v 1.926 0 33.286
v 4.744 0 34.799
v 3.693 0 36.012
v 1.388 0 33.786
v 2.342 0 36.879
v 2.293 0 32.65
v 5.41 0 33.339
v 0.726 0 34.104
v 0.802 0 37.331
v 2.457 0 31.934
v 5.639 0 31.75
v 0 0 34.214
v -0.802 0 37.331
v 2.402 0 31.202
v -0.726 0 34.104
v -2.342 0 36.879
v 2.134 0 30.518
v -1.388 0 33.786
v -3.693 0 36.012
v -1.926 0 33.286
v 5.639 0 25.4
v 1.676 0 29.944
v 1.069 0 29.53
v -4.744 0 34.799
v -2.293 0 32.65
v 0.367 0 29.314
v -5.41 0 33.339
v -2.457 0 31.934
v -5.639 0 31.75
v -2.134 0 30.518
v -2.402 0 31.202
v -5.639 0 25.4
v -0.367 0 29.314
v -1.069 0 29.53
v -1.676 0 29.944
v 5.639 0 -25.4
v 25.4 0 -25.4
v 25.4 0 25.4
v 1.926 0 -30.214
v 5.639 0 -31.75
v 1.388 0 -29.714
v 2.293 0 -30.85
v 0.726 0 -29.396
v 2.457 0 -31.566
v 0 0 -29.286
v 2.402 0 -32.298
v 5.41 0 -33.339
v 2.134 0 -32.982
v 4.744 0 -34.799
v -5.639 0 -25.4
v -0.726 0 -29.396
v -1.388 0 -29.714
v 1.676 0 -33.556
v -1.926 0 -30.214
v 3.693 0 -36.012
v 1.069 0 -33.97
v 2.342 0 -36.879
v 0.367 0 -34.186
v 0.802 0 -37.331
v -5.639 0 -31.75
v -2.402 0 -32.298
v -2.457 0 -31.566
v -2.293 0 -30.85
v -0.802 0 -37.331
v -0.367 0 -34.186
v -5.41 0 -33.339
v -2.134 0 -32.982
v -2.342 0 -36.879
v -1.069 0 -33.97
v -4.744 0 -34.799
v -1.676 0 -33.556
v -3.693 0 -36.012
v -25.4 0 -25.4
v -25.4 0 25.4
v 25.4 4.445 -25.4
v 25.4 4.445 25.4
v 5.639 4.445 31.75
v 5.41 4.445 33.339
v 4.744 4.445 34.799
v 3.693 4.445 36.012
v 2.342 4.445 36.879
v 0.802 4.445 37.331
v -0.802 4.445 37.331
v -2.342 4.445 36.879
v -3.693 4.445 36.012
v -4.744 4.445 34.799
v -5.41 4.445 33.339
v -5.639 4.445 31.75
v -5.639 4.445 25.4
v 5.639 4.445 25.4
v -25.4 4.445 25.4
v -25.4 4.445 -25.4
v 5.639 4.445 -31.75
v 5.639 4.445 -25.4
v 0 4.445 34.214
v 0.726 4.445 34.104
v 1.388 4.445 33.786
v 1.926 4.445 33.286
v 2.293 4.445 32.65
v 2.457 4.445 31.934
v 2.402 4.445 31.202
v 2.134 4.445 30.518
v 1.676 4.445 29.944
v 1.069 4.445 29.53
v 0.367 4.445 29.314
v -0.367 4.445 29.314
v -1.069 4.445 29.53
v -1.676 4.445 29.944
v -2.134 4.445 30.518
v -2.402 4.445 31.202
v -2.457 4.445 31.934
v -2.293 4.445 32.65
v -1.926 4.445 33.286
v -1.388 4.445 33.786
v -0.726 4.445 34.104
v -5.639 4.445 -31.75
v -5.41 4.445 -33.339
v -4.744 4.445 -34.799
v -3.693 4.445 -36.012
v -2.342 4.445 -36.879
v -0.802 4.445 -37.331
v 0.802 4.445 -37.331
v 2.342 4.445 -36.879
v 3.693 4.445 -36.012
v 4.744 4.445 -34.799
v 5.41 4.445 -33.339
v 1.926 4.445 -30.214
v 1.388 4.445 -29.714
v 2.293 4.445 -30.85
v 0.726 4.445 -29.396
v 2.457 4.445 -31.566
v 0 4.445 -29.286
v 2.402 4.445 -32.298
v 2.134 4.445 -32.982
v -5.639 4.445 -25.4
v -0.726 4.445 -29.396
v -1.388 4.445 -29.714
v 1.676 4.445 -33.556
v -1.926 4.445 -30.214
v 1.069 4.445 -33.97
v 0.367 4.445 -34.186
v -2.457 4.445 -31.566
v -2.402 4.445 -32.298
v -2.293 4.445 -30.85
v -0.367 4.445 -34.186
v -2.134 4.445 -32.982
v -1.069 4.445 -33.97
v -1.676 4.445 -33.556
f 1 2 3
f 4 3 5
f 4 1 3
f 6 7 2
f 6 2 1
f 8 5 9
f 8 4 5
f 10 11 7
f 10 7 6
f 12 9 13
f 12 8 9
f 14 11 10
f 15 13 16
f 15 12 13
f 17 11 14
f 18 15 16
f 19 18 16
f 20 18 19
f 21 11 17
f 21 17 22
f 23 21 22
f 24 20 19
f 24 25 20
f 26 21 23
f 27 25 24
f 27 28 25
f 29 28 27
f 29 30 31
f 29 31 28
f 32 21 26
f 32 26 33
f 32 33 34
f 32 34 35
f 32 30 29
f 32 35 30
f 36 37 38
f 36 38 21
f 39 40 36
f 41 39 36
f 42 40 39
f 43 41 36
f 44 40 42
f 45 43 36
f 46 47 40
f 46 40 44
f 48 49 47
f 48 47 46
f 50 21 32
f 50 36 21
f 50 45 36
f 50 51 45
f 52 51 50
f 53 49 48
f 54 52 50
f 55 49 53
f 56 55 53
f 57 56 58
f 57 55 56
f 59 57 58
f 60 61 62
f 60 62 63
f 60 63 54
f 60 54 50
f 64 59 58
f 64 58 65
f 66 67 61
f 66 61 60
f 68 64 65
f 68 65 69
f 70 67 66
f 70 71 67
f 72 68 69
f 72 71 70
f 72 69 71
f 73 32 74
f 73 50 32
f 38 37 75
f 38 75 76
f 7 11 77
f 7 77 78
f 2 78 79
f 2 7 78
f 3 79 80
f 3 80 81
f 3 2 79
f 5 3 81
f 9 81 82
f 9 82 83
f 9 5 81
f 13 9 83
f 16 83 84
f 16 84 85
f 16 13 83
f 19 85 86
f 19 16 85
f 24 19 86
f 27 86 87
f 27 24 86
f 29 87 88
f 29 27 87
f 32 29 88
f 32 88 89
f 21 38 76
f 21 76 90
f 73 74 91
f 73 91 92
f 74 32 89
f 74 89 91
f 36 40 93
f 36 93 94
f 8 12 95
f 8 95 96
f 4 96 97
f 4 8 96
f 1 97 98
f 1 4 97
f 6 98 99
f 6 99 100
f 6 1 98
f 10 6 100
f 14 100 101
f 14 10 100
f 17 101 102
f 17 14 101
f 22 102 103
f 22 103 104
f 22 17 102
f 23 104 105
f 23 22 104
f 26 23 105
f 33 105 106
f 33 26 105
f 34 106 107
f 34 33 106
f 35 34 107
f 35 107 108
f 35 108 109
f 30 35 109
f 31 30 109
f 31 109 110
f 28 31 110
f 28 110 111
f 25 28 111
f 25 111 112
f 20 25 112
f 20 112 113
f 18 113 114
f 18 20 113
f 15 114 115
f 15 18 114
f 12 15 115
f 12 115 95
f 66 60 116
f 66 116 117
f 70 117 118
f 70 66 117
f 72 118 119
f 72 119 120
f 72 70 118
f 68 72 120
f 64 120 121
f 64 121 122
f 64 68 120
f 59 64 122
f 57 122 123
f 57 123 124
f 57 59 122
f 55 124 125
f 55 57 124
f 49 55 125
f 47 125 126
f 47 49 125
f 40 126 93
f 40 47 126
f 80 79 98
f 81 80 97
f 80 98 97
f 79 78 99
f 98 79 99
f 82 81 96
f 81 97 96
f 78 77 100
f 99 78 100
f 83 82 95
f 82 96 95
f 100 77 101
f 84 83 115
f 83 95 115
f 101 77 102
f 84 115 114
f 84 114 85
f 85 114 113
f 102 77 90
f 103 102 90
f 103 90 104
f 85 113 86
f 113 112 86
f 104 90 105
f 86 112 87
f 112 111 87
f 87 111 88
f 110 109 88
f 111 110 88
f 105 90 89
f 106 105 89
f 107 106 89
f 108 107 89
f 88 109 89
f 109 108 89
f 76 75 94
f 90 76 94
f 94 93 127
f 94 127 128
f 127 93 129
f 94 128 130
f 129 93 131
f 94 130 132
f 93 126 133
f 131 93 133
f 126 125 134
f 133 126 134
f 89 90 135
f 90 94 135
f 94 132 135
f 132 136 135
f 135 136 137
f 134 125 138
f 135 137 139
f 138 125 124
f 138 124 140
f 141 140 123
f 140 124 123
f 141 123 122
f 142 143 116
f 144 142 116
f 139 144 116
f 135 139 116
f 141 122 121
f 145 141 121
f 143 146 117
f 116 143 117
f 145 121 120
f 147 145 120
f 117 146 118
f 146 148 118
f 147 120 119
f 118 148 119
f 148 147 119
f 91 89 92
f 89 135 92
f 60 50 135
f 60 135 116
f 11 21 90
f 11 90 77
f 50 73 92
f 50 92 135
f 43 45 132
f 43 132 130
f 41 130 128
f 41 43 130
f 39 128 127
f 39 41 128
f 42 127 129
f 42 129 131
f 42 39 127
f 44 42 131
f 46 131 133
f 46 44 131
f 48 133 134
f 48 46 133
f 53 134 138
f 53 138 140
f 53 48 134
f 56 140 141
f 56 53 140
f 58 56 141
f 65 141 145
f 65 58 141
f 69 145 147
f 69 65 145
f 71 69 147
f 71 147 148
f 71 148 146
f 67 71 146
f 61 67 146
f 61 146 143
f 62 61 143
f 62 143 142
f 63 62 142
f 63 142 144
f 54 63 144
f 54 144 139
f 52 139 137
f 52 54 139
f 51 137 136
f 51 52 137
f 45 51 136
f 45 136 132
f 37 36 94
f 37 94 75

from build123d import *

# Parameters (mm, degrees)
SKETCH1_R           = 2.4638
BOSS_EXTRUDE1_DEPTH = 4.445


with BuildPart() as part:
    # Sketch1 → Boss-Extrude1 (new body)
    with BuildSketch(Plane(origin=(0, 0, 0), x_dir=(1, 0, 0), z_dir=(0, 1, 0))):
        with BuildLine():
            ThreePointArc((5.6388, -31.75), (0, -37.3888), (-5.6388, -31.75))
            Line((-5.6388, -31.75), (-5.6388, -25.4))
            Line((-5.6388, -25.4), (-25.4, -25.4))
            Line((-25.4, -25.4), (-25.4, 25.4))
            Line((-25.4, 25.4), (-5.6388, 25.4))
            Line((-5.6388, 25.4), (-5.6388, 31.75))
            ThreePointArc((-5.6388, 31.75), (0, 37.3888), (5.6388, 31.75))
            Line((5.6388, 31.75), (5.6388, 25.4))
            Line((5.6388, 25.4), (25.4, 25.4))
            Line((25.4, 25.4), (25.4, -25.4))
            Line((25.4, -25.4), (5.6388, -25.4))
            Line((5.6388, -25.4), (5.6388, -31.75))
        make_face()
        with Locations(Location((0, 31.75, 0), (0, 0, 270))):
            Circle(SKETCH1_R, mode=Mode.SUBTRACT)
        with Locations(Location((0, -31.75, 0), (0, 0, 270))):
            Circle(SKETCH1_R, mode=Mode.SUBTRACT)
    extrude(amount=BOSS_EXTRUDE1_DEPTH)


solid = part.part
